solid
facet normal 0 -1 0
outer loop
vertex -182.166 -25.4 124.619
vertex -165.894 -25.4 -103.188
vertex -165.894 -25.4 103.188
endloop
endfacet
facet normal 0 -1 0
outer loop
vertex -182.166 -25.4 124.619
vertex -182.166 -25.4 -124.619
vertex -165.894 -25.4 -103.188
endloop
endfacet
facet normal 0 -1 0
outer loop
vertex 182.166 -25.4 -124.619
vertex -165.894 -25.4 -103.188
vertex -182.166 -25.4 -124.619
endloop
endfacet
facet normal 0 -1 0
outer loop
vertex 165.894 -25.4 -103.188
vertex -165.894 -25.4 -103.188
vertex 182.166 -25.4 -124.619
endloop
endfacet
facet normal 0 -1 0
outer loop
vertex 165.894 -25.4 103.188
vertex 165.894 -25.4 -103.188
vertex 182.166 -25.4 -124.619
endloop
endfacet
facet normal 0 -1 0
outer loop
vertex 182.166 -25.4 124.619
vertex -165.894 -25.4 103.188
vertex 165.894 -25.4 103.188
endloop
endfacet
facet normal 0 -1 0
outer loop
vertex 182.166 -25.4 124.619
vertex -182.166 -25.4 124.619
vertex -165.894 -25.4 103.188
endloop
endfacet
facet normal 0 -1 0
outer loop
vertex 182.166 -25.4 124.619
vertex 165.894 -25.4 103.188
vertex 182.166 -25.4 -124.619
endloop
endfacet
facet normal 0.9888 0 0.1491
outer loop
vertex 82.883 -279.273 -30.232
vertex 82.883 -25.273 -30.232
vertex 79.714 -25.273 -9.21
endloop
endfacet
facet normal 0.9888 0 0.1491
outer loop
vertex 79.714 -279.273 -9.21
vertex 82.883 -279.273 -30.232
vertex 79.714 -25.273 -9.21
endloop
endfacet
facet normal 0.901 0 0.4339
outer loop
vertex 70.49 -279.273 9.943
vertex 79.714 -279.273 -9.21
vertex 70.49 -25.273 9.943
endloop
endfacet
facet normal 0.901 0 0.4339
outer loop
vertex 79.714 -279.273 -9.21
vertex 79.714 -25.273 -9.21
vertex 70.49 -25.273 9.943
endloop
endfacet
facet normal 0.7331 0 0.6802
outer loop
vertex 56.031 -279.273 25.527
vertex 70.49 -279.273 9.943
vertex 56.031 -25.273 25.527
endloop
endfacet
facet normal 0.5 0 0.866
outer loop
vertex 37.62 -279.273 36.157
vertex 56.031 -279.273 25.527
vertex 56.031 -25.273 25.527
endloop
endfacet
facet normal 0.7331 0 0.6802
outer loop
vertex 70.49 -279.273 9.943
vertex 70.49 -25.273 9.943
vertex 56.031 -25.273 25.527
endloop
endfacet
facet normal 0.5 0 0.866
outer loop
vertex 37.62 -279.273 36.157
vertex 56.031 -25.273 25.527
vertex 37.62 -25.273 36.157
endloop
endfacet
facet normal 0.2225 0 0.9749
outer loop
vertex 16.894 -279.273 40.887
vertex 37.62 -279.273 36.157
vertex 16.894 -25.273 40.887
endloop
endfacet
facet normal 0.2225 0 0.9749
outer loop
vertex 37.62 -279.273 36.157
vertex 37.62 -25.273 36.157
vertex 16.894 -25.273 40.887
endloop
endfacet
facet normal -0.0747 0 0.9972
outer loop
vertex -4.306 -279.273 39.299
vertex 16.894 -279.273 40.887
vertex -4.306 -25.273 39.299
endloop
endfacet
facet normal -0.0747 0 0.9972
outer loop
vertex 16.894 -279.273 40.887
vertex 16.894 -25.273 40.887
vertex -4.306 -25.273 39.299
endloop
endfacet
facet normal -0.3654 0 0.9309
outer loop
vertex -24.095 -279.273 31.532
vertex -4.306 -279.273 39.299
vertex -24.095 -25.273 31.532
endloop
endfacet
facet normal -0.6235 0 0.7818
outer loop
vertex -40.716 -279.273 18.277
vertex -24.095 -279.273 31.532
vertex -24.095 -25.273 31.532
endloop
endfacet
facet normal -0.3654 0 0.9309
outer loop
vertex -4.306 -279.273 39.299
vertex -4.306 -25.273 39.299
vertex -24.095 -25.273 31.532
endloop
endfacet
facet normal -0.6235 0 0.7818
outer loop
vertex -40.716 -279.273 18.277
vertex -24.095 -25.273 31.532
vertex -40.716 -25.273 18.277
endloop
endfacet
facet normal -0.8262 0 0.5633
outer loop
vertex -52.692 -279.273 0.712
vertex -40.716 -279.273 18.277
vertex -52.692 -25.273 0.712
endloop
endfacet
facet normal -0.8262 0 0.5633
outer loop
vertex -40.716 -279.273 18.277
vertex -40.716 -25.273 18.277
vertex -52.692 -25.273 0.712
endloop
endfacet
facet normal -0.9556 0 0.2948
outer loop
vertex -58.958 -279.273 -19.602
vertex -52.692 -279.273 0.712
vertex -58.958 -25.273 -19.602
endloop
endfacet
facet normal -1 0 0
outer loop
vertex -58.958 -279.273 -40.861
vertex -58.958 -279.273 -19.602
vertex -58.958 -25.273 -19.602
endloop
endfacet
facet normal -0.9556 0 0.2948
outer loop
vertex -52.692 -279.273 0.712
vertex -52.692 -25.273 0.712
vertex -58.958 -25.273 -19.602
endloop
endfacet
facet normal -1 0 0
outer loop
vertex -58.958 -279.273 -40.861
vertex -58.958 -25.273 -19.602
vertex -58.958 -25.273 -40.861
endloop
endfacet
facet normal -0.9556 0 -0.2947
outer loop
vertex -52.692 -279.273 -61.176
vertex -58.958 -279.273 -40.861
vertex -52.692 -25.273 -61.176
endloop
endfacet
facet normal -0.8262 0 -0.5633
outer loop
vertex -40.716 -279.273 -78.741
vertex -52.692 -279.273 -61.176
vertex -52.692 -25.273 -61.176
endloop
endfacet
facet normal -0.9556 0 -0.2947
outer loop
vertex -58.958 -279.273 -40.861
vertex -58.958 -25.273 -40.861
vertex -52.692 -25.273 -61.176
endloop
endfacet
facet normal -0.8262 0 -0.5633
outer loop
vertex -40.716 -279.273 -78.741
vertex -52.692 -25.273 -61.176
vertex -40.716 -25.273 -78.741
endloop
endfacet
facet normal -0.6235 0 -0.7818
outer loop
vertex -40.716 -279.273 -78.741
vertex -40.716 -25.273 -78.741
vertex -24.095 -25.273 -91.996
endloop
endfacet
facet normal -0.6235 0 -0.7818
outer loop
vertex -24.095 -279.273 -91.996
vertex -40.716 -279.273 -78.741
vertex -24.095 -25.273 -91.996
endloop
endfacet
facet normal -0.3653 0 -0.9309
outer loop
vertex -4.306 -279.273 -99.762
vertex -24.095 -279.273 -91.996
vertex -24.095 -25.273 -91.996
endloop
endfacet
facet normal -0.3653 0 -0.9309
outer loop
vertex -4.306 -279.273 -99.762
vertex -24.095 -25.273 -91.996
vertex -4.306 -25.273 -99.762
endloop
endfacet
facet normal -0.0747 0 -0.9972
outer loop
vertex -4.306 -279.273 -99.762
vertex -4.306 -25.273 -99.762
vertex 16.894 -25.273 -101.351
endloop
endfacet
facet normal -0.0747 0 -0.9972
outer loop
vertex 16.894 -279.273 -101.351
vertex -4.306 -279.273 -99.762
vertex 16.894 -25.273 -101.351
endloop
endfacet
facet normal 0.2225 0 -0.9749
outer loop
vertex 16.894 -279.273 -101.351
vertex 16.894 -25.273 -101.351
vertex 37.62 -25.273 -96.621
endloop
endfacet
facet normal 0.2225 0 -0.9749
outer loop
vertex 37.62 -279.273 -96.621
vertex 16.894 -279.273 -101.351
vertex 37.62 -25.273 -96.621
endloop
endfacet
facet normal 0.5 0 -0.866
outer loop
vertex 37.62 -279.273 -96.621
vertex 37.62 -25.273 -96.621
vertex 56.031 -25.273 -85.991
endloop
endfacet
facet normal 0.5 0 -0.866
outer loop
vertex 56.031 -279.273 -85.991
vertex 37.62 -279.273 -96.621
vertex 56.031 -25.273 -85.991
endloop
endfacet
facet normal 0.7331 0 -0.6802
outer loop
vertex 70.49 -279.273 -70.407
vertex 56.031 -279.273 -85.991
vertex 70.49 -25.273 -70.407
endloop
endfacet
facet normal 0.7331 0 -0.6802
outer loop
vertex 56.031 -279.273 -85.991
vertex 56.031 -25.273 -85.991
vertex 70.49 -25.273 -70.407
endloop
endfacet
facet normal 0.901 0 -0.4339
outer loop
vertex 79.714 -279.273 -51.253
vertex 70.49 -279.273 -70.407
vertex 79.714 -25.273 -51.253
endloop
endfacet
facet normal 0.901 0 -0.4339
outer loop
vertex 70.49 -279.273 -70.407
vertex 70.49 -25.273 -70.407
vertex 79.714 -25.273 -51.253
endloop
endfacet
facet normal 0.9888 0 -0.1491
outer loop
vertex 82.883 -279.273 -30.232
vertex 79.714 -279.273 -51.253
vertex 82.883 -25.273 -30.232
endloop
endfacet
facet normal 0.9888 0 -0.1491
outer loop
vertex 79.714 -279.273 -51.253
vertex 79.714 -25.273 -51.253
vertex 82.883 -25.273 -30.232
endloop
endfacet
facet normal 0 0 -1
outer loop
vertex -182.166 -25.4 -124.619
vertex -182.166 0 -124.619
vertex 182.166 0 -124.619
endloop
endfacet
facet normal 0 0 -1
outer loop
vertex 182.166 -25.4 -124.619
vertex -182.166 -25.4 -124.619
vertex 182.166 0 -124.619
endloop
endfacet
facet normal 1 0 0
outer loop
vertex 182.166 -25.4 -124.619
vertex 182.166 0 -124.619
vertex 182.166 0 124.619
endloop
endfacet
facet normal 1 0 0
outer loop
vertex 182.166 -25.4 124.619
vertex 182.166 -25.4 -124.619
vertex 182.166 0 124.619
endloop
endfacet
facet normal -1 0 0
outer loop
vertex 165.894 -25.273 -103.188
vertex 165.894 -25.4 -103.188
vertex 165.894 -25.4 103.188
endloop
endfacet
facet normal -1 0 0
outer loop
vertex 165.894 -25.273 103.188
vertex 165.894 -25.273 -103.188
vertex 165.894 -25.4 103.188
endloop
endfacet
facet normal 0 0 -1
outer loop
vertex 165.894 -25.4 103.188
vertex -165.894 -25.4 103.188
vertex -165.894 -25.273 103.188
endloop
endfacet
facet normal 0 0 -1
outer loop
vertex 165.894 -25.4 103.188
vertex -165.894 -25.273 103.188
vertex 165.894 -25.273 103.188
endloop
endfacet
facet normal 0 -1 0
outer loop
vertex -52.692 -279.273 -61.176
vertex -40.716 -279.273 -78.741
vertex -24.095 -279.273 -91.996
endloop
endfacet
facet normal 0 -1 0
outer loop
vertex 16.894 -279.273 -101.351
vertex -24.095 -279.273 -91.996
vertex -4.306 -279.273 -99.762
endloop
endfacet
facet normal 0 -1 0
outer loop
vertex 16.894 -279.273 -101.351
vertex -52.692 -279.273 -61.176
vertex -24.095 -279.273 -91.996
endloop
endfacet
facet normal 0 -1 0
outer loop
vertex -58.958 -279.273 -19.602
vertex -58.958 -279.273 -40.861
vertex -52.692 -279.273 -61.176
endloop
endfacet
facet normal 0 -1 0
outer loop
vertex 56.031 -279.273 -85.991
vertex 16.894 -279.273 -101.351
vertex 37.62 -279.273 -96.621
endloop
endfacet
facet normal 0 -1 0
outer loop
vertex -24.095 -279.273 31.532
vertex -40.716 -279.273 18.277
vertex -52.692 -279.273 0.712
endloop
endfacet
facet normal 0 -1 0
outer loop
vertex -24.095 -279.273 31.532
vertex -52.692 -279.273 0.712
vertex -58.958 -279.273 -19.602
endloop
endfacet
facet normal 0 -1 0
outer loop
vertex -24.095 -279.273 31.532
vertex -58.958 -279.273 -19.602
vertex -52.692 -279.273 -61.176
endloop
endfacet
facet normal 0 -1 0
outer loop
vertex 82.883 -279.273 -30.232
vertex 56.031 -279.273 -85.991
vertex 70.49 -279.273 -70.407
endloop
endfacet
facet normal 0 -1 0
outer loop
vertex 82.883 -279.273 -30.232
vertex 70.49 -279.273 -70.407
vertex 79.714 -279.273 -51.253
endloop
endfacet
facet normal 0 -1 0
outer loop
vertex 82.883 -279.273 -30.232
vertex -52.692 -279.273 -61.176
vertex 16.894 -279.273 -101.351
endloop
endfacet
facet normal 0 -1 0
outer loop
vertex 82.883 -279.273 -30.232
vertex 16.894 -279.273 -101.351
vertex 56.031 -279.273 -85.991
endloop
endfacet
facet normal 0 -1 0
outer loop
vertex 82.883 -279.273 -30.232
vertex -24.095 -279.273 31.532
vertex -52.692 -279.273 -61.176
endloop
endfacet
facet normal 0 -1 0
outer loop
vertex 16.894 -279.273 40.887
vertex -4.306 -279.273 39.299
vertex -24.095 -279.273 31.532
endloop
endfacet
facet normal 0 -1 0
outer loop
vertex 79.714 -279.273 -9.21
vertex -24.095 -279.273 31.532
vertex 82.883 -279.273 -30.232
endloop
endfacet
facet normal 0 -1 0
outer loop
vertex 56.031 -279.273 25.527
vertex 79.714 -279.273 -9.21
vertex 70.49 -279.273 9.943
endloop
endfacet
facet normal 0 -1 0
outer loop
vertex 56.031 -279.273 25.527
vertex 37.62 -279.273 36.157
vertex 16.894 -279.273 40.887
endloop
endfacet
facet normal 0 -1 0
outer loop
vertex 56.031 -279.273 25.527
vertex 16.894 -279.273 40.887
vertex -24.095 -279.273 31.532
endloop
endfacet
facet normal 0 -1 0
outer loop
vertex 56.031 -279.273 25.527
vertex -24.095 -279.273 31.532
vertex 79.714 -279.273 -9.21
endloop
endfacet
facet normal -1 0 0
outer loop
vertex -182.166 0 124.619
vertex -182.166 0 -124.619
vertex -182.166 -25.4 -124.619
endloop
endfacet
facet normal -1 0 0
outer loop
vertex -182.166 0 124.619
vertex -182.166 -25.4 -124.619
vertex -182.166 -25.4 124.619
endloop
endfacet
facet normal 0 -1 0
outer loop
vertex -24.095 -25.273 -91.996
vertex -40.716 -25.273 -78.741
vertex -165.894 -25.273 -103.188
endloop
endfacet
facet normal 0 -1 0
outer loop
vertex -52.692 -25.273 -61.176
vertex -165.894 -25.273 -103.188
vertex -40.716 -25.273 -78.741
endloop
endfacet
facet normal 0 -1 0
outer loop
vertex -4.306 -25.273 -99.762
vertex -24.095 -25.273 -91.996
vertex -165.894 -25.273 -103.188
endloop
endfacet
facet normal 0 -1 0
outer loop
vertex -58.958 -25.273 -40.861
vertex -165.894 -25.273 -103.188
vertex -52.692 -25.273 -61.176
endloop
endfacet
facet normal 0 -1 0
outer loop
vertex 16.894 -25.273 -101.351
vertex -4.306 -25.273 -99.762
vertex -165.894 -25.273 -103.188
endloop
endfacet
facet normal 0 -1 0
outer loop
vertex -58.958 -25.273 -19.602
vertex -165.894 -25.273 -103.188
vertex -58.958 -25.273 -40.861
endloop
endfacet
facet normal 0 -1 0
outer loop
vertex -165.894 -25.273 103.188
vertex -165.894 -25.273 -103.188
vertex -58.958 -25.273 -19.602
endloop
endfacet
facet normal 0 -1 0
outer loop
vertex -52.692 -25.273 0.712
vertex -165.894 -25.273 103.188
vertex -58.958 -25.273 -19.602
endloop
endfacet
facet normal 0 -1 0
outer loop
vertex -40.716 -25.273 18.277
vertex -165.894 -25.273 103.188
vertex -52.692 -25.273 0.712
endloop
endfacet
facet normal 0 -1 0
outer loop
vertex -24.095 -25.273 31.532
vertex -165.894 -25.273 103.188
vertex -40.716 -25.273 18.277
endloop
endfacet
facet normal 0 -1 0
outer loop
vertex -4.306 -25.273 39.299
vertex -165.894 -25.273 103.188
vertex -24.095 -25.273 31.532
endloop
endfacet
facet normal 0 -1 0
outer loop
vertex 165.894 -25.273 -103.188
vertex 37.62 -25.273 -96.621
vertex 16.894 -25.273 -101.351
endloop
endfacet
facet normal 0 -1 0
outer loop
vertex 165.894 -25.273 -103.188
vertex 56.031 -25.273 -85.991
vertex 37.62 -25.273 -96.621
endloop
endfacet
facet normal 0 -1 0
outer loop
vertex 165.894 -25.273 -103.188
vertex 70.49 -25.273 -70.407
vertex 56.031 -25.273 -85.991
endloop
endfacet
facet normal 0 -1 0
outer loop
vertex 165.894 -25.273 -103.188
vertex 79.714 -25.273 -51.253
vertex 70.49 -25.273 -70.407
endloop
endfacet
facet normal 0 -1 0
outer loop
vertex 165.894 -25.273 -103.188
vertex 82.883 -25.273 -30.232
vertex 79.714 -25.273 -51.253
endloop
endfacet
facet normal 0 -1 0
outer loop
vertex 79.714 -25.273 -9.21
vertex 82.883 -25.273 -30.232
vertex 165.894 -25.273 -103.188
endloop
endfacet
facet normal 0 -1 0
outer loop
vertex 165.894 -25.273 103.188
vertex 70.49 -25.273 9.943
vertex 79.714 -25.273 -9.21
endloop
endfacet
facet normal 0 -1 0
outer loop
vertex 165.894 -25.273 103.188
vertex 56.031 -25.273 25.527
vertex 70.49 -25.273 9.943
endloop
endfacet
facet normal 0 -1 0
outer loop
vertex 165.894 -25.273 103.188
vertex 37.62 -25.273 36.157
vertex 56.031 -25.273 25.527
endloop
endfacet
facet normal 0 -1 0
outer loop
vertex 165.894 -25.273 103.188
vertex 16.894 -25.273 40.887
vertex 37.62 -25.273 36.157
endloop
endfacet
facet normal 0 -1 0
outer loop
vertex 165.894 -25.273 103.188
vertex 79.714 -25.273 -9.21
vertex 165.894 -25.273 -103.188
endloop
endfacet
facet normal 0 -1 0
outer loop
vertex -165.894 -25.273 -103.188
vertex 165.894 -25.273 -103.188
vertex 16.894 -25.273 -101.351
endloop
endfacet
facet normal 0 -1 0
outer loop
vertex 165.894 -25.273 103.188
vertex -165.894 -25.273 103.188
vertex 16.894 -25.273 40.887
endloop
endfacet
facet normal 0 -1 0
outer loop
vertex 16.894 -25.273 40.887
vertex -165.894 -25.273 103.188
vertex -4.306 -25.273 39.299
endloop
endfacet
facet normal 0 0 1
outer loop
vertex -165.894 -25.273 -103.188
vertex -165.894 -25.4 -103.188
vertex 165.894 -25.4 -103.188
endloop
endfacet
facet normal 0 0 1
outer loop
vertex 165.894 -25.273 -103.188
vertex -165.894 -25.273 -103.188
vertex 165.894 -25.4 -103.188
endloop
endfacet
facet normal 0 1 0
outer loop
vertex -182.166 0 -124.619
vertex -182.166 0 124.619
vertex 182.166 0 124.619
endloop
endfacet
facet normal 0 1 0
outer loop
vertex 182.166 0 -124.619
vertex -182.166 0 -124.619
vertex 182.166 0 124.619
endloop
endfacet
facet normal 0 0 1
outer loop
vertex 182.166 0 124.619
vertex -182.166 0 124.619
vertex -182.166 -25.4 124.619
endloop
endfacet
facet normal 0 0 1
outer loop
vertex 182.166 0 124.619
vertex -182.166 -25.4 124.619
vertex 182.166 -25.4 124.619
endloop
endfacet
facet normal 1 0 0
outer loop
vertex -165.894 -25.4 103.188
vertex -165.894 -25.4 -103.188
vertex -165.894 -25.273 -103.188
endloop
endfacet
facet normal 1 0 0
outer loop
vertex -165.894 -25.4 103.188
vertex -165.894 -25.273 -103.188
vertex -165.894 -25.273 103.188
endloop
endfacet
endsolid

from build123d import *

# Parameters (mm, degrees)
F0_W     = 364.33125
F0_H     = 249.2375
F1_DEPTH = 25.4
F2_W     = 331.7875
F2_H     = 206.375
F3_DEPTH = 0.127
F4_R     = 71.318712
F5_DEPTH = 254


with BuildPart() as f1:
    # F0 (on Front) → F1 (new body)
    with BuildSketch(Plane.XZ):
        Rectangle(F0_W, F0_H)
    extrude(amount=F1_DEPTH)

    # F2 (on face) → F3 (cut)
    with BuildSketch(Plane.XZ.offset(25.4)):
        Rectangle(F2_W, F2_H)
    extrude(amount=-F3_DEPTH, mode=Mode.SUBTRACT)

    # F4 (on face) → F5 (join)
    with BuildSketch(Plane.XZ.offset(25.273)):
        with Locations((11.564023, -30.23188)):
            Circle(F4_R)
    extrude(amount=F5_DEPTH)


solid = f1.part
